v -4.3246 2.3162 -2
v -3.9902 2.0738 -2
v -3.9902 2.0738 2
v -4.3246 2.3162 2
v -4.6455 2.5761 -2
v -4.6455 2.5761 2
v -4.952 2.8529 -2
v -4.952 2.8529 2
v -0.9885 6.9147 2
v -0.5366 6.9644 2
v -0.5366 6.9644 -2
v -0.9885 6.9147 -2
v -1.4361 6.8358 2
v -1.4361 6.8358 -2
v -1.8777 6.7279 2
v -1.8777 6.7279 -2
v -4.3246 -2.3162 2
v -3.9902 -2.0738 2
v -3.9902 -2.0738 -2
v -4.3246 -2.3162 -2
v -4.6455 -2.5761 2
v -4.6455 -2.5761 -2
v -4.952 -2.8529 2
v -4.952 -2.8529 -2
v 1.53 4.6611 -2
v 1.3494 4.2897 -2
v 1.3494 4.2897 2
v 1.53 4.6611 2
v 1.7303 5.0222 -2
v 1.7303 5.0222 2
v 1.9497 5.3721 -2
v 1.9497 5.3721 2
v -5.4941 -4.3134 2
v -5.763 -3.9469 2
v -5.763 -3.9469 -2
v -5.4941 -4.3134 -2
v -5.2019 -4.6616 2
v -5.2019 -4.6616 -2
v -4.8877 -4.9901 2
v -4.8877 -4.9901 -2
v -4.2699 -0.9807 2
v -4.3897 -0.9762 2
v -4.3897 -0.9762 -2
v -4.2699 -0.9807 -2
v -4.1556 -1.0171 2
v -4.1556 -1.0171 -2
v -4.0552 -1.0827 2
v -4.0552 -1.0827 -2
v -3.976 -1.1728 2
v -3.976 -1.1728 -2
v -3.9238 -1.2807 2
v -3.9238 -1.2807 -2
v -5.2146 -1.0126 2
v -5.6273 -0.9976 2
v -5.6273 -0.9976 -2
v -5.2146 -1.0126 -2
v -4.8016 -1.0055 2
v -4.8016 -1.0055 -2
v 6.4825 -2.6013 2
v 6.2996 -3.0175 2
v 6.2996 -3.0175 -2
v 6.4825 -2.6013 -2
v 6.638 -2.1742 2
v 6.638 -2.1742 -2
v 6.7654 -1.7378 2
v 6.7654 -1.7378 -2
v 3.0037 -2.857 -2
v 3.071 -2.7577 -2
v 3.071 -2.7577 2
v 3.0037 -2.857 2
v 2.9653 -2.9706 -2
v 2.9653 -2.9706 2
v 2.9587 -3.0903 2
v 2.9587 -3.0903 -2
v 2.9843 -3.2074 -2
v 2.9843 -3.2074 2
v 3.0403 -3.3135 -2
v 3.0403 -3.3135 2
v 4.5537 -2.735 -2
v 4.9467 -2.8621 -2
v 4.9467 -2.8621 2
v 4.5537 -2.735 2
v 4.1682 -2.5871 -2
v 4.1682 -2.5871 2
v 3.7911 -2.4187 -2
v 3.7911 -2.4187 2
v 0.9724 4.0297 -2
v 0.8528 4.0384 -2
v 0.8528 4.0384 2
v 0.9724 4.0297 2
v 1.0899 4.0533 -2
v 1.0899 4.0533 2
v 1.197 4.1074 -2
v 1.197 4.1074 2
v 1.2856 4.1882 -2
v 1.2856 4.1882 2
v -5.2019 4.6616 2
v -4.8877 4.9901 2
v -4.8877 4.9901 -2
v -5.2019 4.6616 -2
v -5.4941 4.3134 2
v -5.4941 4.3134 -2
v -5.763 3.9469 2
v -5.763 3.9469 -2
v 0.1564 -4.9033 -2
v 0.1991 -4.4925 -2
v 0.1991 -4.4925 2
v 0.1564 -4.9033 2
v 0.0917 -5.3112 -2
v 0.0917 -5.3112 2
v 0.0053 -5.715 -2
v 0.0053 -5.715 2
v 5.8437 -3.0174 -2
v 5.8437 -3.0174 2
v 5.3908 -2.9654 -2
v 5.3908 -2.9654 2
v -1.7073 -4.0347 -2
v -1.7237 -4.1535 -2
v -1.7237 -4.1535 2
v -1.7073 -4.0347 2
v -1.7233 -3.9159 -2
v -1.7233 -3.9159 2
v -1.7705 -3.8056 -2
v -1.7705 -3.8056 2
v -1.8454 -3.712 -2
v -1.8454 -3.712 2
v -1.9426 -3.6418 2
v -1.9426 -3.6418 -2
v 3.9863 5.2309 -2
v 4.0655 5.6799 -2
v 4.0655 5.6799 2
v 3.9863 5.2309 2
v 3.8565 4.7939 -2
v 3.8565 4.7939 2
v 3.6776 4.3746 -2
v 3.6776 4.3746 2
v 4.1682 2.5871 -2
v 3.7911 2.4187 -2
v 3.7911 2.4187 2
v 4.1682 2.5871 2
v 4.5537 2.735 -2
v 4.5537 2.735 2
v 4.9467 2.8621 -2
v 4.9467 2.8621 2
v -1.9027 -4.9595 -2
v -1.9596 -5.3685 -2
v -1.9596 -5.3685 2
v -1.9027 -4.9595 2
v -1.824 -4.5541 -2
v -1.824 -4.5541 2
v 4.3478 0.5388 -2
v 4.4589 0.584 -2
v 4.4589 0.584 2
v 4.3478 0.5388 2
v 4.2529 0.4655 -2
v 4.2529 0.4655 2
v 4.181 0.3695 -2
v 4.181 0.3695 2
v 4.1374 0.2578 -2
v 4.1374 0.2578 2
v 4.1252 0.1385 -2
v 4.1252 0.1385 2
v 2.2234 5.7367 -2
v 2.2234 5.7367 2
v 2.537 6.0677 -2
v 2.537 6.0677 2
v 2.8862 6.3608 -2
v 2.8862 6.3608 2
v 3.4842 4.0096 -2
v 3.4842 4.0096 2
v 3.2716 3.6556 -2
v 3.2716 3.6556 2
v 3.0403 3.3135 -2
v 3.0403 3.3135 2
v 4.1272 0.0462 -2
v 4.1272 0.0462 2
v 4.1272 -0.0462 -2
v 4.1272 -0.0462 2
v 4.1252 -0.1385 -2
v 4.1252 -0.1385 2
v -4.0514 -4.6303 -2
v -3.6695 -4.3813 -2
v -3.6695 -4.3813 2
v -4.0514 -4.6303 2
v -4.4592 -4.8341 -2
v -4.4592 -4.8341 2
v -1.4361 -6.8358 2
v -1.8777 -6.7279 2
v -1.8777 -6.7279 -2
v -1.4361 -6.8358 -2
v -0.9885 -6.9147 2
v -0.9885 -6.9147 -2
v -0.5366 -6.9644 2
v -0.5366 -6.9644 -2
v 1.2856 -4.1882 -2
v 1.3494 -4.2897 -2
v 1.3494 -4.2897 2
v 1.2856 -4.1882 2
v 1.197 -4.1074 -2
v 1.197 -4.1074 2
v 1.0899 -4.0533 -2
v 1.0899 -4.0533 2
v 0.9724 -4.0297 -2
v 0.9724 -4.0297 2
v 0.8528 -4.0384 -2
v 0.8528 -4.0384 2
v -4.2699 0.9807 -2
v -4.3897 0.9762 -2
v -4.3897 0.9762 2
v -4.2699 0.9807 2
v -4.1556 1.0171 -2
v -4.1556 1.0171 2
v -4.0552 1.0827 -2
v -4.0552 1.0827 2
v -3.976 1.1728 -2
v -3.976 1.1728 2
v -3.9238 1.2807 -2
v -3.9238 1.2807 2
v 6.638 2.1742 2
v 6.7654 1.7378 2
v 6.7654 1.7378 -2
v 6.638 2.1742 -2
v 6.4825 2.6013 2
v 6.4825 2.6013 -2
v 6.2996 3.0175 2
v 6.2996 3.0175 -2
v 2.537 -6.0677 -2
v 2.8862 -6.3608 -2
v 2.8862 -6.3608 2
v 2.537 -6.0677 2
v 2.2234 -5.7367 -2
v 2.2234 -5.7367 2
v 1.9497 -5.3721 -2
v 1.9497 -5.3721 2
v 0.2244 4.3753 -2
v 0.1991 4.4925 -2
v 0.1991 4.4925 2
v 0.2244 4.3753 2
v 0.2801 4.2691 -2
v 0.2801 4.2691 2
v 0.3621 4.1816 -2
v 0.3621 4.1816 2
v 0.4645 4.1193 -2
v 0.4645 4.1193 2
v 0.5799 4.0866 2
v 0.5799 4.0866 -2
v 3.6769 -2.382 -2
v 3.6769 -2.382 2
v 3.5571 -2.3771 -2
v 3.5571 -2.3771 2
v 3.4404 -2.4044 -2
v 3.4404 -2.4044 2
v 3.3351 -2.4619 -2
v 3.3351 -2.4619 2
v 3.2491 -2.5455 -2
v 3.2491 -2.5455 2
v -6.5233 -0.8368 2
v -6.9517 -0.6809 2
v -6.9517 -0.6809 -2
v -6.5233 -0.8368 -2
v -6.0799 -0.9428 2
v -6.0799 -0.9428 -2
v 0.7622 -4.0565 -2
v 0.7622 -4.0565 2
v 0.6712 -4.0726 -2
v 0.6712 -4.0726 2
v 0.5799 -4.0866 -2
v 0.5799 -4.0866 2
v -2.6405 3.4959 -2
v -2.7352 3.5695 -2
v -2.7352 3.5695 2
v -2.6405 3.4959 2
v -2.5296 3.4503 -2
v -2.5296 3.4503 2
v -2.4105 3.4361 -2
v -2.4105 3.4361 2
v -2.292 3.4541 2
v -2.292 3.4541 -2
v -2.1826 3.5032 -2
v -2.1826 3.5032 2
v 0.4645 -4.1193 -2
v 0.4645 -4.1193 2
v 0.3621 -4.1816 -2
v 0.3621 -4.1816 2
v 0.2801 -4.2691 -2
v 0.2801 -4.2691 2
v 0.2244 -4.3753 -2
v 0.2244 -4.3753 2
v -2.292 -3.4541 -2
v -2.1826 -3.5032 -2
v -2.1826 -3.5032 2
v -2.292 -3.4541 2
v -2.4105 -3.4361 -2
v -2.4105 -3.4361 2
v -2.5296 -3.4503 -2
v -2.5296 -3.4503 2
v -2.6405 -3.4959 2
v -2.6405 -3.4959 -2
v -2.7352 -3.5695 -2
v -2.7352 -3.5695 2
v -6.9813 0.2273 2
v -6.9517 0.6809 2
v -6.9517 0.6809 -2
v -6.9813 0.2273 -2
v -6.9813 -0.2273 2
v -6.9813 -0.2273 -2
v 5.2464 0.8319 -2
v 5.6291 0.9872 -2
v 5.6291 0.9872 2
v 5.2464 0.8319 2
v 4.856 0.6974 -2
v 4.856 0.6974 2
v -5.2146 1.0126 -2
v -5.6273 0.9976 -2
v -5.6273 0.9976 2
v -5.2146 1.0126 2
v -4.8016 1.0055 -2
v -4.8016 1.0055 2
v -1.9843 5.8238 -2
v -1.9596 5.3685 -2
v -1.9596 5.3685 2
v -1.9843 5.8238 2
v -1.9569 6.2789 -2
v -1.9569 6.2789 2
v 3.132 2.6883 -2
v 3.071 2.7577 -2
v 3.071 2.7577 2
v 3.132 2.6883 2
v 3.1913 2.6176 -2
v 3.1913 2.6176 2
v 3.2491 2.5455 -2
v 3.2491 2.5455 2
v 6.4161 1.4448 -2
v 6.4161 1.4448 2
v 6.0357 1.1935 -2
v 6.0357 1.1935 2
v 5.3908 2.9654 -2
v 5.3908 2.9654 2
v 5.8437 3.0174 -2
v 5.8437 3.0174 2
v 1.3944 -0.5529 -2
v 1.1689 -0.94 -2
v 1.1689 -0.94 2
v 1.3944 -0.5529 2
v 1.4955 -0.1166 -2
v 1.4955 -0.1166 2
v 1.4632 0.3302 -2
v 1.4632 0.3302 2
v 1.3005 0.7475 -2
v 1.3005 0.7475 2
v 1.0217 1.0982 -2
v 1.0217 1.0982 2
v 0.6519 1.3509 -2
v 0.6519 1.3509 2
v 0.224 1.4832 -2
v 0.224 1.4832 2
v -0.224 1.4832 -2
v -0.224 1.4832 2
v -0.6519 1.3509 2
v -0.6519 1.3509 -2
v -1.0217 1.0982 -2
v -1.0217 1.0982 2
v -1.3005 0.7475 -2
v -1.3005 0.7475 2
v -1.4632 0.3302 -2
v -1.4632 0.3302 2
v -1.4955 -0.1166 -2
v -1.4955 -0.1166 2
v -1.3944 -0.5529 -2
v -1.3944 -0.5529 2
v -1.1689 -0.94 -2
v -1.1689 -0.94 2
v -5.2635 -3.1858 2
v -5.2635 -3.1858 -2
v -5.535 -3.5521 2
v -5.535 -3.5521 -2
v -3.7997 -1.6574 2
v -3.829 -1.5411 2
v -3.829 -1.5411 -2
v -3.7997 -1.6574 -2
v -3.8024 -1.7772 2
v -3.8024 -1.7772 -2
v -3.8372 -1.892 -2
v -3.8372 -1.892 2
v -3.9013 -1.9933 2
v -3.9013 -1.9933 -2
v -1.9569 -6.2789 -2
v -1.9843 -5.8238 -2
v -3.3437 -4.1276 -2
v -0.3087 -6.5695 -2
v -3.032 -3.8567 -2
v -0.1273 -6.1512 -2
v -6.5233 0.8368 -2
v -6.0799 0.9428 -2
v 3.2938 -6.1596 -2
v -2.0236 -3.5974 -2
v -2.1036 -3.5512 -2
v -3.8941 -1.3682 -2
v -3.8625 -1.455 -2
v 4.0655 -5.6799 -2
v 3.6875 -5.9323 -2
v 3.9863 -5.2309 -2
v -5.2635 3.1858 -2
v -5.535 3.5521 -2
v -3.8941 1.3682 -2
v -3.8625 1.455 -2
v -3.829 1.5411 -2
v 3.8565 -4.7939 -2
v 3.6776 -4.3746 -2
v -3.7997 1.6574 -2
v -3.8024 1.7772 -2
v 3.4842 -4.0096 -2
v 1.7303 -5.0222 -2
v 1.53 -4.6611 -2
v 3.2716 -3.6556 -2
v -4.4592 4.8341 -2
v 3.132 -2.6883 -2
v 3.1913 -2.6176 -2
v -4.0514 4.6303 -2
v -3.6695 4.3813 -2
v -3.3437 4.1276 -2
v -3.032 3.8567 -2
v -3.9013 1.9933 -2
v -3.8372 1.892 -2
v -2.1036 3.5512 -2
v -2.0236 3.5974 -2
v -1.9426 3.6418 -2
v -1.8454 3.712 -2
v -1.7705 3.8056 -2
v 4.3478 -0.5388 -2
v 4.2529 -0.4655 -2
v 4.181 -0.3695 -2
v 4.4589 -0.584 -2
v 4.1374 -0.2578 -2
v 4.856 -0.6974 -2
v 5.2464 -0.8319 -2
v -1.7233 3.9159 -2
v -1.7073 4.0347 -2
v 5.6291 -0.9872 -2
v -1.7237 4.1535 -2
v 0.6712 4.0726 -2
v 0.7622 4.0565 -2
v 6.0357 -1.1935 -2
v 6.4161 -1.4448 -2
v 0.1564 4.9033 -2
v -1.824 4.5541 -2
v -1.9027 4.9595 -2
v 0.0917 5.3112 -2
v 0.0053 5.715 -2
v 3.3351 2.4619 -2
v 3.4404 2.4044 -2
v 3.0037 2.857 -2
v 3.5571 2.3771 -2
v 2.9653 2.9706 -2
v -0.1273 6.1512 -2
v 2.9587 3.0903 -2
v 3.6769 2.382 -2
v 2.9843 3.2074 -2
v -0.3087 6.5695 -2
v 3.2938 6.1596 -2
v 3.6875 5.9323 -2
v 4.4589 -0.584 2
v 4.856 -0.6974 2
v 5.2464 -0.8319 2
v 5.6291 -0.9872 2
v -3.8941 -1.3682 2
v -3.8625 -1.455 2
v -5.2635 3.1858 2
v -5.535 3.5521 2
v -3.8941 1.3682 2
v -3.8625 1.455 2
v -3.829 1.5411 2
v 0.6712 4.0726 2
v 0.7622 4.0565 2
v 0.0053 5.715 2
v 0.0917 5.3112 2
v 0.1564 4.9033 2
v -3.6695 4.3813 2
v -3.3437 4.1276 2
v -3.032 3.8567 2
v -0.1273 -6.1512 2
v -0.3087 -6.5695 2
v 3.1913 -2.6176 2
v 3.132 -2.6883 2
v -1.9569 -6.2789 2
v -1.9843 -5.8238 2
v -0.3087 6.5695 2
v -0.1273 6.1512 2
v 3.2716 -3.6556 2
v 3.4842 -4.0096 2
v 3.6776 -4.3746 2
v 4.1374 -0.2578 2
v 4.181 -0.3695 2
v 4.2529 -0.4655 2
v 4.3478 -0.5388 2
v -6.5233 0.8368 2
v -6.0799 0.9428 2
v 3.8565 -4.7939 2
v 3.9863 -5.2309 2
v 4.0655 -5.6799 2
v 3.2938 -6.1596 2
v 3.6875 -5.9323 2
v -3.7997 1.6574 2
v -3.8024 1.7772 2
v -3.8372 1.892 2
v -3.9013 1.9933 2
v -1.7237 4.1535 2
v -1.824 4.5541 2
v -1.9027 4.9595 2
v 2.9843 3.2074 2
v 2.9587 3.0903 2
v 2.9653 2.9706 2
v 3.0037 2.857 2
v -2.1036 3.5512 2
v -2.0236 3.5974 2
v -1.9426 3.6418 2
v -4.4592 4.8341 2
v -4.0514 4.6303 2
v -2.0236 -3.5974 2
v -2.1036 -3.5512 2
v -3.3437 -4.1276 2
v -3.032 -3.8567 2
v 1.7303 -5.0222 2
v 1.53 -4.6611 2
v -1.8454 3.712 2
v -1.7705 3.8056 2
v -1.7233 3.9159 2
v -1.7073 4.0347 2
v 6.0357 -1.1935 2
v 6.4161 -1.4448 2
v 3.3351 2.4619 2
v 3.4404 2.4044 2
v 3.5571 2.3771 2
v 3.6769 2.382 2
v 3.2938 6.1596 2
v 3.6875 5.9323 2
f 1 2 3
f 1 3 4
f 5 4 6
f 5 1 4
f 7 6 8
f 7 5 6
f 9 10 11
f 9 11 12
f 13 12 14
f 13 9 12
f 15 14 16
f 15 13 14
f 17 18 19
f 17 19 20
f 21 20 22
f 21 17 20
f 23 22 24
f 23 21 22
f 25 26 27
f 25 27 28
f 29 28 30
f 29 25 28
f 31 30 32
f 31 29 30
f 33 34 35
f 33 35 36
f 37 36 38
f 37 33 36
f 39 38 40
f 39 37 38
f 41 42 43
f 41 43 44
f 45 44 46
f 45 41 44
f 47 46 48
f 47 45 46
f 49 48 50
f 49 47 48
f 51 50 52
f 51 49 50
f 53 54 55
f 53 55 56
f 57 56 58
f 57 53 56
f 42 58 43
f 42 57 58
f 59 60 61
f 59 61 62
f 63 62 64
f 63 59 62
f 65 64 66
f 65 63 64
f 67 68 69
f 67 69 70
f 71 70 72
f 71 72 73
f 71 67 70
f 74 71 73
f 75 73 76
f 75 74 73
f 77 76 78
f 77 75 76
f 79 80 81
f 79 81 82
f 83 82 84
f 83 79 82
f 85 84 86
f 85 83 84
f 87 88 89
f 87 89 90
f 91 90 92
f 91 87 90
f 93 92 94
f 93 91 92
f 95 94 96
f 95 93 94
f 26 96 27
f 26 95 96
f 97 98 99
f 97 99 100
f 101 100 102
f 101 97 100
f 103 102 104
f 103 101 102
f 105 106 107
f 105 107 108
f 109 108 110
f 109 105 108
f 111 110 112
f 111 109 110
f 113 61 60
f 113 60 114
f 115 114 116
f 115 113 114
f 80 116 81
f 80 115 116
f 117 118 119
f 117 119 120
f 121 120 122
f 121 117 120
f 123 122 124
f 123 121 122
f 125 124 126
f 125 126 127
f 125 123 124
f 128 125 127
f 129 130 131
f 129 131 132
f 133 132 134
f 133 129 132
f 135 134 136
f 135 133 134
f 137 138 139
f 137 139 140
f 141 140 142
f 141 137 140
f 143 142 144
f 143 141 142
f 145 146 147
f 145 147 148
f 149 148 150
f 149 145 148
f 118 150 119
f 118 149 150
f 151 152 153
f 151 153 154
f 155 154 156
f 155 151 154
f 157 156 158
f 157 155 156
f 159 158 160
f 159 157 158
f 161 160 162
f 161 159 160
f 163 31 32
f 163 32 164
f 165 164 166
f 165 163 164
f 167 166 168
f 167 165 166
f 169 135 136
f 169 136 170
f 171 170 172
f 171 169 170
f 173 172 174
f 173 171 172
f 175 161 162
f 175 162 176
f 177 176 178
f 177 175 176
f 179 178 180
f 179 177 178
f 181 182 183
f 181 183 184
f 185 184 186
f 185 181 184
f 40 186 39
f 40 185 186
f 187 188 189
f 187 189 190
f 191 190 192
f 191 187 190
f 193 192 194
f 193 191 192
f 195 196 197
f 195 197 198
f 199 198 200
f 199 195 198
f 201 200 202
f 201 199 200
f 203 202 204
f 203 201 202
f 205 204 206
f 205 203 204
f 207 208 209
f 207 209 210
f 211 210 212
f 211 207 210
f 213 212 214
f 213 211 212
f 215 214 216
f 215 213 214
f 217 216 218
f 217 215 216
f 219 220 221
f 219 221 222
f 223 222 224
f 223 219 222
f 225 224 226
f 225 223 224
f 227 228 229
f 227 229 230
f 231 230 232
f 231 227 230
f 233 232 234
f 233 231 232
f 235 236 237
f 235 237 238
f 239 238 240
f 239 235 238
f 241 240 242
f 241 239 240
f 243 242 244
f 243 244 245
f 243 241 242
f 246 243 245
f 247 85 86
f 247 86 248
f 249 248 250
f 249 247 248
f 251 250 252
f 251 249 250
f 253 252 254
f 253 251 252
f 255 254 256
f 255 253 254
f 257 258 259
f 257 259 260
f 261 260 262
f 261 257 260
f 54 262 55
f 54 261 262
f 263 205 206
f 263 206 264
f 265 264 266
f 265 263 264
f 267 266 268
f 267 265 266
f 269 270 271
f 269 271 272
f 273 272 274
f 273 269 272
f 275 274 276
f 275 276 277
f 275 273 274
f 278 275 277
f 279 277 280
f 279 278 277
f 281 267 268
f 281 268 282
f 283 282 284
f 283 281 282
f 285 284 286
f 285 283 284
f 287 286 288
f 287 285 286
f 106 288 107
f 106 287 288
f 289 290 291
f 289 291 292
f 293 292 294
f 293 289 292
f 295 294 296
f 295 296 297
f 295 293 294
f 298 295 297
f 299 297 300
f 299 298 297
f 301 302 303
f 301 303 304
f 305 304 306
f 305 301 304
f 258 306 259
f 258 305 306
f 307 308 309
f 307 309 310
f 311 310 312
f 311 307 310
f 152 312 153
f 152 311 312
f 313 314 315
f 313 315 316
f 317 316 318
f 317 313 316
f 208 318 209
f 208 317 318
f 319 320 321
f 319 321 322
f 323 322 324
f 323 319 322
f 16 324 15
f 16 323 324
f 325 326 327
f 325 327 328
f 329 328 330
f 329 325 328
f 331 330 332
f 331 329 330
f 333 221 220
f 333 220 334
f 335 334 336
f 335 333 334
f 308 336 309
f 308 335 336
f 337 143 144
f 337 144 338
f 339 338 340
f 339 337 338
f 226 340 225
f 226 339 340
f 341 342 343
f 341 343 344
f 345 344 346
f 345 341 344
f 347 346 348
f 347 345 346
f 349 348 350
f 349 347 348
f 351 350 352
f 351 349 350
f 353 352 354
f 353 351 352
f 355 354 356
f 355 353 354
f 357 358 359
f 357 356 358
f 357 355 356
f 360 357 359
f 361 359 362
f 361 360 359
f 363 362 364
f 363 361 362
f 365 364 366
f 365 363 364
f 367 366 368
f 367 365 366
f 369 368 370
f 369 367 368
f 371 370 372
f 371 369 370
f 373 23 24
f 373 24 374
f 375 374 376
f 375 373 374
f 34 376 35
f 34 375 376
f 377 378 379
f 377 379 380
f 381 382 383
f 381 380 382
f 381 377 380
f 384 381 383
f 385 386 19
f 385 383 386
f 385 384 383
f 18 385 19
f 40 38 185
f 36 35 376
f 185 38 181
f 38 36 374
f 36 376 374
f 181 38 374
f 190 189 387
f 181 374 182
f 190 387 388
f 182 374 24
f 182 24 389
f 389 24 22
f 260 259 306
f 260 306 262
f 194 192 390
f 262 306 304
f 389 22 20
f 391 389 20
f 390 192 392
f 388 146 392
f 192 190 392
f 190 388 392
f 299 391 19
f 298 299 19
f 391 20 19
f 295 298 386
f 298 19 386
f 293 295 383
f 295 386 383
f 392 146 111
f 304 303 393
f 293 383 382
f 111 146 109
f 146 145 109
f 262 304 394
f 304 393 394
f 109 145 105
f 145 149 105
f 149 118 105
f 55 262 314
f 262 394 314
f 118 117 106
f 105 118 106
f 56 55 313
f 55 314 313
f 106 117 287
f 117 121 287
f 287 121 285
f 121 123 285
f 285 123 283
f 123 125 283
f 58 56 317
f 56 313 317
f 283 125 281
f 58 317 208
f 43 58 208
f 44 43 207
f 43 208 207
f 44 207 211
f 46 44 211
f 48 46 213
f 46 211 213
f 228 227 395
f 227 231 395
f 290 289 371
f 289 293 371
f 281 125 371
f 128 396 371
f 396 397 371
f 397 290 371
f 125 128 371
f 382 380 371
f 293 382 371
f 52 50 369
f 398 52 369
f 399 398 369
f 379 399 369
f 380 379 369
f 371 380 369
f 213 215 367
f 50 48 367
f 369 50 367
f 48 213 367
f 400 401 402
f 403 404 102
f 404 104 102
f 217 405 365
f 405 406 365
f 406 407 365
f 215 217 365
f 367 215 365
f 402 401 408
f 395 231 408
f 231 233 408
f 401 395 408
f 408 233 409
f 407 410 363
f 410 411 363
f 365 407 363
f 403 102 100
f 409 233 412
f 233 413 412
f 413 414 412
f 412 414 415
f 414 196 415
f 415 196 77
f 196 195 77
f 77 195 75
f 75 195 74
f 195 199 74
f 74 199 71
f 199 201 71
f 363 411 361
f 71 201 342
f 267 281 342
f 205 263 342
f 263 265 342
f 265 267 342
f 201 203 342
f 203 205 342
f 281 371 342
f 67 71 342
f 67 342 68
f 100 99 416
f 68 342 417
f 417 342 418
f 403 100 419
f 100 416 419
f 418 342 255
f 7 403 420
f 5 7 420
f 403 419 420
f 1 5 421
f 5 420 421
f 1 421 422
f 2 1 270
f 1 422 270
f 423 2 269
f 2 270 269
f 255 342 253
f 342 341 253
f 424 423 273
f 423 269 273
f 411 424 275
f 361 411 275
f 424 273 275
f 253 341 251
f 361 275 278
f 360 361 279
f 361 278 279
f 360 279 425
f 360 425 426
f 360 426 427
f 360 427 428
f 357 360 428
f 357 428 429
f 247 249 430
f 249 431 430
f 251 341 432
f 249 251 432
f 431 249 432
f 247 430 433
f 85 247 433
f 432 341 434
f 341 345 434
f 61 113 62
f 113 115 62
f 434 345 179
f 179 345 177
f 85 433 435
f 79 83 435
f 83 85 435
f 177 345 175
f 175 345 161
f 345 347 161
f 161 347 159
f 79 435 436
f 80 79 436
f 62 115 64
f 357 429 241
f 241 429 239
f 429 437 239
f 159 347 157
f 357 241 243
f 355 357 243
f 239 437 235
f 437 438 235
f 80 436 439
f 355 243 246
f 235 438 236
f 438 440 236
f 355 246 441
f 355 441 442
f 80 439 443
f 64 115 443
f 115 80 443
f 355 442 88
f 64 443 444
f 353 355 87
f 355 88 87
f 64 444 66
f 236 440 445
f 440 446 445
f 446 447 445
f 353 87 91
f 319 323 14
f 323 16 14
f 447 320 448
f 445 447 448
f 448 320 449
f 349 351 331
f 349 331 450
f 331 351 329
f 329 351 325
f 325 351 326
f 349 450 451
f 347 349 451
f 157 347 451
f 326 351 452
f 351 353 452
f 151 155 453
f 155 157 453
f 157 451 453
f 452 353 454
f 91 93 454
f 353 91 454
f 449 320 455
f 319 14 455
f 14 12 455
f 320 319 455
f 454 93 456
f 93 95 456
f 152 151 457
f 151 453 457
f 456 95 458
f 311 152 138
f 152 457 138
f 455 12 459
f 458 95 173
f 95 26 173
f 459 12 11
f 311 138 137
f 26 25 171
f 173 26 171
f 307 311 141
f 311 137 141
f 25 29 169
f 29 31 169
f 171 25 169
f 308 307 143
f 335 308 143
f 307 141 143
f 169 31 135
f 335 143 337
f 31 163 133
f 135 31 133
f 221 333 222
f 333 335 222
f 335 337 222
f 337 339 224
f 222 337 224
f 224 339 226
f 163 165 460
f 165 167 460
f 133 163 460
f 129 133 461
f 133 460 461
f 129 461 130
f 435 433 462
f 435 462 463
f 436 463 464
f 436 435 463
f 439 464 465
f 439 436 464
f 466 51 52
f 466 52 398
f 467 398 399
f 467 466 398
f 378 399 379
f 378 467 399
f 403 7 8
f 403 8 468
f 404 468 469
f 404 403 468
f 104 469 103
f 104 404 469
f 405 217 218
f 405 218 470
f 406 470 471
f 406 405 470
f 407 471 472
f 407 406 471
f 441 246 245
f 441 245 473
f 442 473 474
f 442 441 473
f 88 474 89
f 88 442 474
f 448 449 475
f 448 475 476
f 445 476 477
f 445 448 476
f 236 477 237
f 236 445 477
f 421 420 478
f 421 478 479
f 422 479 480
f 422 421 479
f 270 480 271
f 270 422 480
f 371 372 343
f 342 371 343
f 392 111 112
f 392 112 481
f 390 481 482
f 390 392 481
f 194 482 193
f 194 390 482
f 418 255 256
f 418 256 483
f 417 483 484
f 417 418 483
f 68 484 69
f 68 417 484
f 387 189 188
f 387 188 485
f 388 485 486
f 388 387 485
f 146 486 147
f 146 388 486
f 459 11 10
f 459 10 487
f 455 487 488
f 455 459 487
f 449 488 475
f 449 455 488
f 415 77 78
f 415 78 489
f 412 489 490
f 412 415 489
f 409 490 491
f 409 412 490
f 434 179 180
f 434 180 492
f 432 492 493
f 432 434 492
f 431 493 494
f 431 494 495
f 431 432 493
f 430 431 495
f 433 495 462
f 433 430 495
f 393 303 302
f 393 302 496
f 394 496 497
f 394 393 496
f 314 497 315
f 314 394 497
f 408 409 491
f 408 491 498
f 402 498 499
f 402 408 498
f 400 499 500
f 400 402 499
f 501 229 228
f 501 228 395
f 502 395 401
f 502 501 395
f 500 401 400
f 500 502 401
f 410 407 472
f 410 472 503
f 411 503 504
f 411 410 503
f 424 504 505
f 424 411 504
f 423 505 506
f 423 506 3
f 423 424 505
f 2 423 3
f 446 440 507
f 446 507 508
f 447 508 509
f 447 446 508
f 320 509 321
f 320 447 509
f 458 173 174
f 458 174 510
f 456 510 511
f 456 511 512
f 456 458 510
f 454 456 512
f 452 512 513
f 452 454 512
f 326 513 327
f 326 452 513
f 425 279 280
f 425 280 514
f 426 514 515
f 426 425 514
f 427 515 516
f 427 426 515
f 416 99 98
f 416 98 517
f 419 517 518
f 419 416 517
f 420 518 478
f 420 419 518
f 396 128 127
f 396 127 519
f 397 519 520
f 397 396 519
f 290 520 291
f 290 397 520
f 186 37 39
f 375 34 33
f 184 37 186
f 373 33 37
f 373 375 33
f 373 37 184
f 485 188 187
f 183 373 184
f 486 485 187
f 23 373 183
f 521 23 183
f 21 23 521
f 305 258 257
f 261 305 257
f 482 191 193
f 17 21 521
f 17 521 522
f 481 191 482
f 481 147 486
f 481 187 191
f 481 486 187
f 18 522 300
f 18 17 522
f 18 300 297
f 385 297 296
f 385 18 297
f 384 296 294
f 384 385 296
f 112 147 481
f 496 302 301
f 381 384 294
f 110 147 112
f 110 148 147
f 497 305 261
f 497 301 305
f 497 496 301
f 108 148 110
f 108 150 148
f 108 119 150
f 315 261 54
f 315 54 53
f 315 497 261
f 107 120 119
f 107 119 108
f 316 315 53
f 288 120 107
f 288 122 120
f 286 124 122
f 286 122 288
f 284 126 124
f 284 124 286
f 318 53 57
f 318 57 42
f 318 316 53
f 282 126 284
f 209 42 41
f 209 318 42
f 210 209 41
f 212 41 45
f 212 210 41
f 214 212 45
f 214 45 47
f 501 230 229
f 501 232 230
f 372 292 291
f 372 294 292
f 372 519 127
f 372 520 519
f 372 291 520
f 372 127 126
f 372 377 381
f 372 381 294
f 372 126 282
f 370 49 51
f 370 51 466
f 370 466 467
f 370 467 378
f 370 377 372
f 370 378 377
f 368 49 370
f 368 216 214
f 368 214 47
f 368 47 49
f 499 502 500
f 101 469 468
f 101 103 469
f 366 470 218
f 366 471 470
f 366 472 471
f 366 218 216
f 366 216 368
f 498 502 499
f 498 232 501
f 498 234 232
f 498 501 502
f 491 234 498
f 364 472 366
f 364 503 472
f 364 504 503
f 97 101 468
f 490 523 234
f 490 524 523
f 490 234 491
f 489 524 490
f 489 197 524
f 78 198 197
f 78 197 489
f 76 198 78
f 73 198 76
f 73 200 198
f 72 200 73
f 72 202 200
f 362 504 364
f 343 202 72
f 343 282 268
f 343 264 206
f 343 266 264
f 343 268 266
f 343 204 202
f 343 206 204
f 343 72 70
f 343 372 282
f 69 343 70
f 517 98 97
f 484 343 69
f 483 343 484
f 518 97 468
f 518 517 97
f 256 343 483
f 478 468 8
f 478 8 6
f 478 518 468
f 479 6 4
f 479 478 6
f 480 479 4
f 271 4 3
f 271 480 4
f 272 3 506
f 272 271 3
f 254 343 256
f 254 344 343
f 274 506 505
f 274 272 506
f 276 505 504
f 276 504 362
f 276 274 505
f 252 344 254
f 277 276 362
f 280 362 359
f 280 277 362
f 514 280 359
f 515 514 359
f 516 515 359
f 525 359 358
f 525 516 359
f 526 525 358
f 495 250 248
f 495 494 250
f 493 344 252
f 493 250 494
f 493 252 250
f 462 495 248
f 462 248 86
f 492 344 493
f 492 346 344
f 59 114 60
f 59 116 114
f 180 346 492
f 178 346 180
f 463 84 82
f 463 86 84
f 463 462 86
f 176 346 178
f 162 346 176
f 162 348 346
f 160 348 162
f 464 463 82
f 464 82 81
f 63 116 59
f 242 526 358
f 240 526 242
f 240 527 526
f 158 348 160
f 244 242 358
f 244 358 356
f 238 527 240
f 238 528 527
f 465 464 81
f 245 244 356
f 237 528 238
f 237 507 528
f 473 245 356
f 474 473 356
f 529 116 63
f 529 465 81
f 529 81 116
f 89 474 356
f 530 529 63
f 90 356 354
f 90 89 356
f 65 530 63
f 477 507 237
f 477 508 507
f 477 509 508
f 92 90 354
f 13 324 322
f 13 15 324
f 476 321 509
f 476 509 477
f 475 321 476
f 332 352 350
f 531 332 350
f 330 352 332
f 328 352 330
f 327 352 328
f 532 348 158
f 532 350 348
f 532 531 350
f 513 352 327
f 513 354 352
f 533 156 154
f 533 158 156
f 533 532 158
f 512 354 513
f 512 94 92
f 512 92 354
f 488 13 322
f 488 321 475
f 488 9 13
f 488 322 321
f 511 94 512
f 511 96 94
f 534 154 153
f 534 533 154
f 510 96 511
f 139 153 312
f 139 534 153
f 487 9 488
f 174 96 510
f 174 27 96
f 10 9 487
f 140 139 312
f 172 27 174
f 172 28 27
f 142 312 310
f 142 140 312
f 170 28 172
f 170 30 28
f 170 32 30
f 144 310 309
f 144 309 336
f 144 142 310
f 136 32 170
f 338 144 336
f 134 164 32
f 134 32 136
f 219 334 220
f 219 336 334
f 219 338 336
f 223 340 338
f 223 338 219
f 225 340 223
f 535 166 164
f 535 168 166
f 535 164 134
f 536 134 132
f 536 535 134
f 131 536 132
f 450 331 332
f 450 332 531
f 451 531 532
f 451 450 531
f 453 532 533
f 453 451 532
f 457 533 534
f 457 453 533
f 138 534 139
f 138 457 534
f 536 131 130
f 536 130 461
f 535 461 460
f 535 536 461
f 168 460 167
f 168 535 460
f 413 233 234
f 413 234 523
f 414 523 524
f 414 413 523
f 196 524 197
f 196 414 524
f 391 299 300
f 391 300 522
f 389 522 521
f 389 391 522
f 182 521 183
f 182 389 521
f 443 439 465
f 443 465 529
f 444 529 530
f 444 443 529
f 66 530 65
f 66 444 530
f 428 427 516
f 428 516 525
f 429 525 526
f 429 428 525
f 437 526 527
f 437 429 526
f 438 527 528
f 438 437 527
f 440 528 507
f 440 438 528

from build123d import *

# Parameters (mm, degrees)
SKETCH1_R                = 6.985
BLANK_DISK_DEPTH         = 2.000000064
GEAR_TOOTH_CUT_DEPTH     = 11.657412961
GEAR_TEETH_REVOLVE_COUNT = 9
SKETCH4_R                = 0.75
HUB_EXTRUDE_DEPTH        = 0.635
HEX_BORE_CUT_DEPTH       = 11.643895353
HEX_BORE_CUT_DEPTH_BACK  = 11.643895353


with BuildPart() as part:
    # Sketch1 → BLANK DISK (new, symmetric)
    with BuildSketch(Plane.XY):
        Circle(SKETCH1_R)
    extrude(amount=BLANK_DISK_DEPTH, both=True)

    # Sketch2 → GEAR TOOTH CUT (cut, through all)
    with BuildSketch(Plane.XY.offset(2.000000064)):
        with BuildLine():
            ThreePointArc((-5.763009467, -3.946890786), (-6.563752956, -2.389010701), (-6.951733872, -0.680897326))
            ThreePointArc((-6.951733872, -0.680897326), (-6.303106227, -0.89616004), (-5.627259472, -0.997585))
            ThreePointArc((-5.627259472, -0.997585), (-5.00805343, -1.01182167), (-4.389706578, -0.976241119))
            ThreePointArc((-4.389706578, -0.976241119), (-4.103194142, -1.046520353), (-3.923782009, -1.280699416))
            ThreePointArc((-3.923782009, -1.280699416), (-3.878581292, -1.411688142), (-3.82900912, -1.541085788))
            ThreePointArc((-3.82900912, -1.541085788), (-3.815919388, -1.835801253), (-3.990226026, -2.073804914))
            ThreePointArc((-3.990226026, -2.073804914), (-4.486777934, -2.444014326), (-4.951966126, -2.852938219))
            ThreePointArc((-4.951966126, -2.852938219), (-5.404500069, -3.365060167), (-5.763009467, -3.946890786))
        make_face()
    gear_tooth_cut = extrude(amount=-GEAR_TOOTH_CUT_DEPTH, mode=Mode.SUBTRACT)

    # GEAR TEETH REVOLVE: GEAR TOOTH CUT ×9 about axis
    gear_teeth_revolve_axis = Axis((0, 0, 50), (0, 0, -1))
    for i in range(1, GEAR_TEETH_REVOLVE_COUNT):
        add(gear_tooth_cut.rotate(gear_teeth_revolve_axis, i * 360 / GEAR_TEETH_REVOLVE_COUNT), mode=Mode.SUBTRACT)

    # Sketch4 → Hub Extrude (add)
    with BuildSketch(Plane.XY.offset(2.000000064)):
        Circle(SKETCH4_R)
    extrude(amount=HUB_EXTRUDE_DEPTH)

    # Sketch3 → HEX BORE CUT (cut, two sides: drawn at the far end of the back side and taken through both)
    with BuildSketch(Plane.XY.offset(2.000000064).offset(-HEX_BORE_CUT_DEPTH_BACK)):
        with BuildLine():
            Line((-1.168931136, -0.94), (1.168931136, -0.94))
            ThreePointArc((1.168931136, -0.94), (0, 1.5), (-1.168931136, -0.94))
        make_face()
    extrude(amount=HEX_BORE_CUT_DEPTH + HEX_BORE_CUT_DEPTH_BACK, mode=Mode.SUBTRACT)


solid = part.part
